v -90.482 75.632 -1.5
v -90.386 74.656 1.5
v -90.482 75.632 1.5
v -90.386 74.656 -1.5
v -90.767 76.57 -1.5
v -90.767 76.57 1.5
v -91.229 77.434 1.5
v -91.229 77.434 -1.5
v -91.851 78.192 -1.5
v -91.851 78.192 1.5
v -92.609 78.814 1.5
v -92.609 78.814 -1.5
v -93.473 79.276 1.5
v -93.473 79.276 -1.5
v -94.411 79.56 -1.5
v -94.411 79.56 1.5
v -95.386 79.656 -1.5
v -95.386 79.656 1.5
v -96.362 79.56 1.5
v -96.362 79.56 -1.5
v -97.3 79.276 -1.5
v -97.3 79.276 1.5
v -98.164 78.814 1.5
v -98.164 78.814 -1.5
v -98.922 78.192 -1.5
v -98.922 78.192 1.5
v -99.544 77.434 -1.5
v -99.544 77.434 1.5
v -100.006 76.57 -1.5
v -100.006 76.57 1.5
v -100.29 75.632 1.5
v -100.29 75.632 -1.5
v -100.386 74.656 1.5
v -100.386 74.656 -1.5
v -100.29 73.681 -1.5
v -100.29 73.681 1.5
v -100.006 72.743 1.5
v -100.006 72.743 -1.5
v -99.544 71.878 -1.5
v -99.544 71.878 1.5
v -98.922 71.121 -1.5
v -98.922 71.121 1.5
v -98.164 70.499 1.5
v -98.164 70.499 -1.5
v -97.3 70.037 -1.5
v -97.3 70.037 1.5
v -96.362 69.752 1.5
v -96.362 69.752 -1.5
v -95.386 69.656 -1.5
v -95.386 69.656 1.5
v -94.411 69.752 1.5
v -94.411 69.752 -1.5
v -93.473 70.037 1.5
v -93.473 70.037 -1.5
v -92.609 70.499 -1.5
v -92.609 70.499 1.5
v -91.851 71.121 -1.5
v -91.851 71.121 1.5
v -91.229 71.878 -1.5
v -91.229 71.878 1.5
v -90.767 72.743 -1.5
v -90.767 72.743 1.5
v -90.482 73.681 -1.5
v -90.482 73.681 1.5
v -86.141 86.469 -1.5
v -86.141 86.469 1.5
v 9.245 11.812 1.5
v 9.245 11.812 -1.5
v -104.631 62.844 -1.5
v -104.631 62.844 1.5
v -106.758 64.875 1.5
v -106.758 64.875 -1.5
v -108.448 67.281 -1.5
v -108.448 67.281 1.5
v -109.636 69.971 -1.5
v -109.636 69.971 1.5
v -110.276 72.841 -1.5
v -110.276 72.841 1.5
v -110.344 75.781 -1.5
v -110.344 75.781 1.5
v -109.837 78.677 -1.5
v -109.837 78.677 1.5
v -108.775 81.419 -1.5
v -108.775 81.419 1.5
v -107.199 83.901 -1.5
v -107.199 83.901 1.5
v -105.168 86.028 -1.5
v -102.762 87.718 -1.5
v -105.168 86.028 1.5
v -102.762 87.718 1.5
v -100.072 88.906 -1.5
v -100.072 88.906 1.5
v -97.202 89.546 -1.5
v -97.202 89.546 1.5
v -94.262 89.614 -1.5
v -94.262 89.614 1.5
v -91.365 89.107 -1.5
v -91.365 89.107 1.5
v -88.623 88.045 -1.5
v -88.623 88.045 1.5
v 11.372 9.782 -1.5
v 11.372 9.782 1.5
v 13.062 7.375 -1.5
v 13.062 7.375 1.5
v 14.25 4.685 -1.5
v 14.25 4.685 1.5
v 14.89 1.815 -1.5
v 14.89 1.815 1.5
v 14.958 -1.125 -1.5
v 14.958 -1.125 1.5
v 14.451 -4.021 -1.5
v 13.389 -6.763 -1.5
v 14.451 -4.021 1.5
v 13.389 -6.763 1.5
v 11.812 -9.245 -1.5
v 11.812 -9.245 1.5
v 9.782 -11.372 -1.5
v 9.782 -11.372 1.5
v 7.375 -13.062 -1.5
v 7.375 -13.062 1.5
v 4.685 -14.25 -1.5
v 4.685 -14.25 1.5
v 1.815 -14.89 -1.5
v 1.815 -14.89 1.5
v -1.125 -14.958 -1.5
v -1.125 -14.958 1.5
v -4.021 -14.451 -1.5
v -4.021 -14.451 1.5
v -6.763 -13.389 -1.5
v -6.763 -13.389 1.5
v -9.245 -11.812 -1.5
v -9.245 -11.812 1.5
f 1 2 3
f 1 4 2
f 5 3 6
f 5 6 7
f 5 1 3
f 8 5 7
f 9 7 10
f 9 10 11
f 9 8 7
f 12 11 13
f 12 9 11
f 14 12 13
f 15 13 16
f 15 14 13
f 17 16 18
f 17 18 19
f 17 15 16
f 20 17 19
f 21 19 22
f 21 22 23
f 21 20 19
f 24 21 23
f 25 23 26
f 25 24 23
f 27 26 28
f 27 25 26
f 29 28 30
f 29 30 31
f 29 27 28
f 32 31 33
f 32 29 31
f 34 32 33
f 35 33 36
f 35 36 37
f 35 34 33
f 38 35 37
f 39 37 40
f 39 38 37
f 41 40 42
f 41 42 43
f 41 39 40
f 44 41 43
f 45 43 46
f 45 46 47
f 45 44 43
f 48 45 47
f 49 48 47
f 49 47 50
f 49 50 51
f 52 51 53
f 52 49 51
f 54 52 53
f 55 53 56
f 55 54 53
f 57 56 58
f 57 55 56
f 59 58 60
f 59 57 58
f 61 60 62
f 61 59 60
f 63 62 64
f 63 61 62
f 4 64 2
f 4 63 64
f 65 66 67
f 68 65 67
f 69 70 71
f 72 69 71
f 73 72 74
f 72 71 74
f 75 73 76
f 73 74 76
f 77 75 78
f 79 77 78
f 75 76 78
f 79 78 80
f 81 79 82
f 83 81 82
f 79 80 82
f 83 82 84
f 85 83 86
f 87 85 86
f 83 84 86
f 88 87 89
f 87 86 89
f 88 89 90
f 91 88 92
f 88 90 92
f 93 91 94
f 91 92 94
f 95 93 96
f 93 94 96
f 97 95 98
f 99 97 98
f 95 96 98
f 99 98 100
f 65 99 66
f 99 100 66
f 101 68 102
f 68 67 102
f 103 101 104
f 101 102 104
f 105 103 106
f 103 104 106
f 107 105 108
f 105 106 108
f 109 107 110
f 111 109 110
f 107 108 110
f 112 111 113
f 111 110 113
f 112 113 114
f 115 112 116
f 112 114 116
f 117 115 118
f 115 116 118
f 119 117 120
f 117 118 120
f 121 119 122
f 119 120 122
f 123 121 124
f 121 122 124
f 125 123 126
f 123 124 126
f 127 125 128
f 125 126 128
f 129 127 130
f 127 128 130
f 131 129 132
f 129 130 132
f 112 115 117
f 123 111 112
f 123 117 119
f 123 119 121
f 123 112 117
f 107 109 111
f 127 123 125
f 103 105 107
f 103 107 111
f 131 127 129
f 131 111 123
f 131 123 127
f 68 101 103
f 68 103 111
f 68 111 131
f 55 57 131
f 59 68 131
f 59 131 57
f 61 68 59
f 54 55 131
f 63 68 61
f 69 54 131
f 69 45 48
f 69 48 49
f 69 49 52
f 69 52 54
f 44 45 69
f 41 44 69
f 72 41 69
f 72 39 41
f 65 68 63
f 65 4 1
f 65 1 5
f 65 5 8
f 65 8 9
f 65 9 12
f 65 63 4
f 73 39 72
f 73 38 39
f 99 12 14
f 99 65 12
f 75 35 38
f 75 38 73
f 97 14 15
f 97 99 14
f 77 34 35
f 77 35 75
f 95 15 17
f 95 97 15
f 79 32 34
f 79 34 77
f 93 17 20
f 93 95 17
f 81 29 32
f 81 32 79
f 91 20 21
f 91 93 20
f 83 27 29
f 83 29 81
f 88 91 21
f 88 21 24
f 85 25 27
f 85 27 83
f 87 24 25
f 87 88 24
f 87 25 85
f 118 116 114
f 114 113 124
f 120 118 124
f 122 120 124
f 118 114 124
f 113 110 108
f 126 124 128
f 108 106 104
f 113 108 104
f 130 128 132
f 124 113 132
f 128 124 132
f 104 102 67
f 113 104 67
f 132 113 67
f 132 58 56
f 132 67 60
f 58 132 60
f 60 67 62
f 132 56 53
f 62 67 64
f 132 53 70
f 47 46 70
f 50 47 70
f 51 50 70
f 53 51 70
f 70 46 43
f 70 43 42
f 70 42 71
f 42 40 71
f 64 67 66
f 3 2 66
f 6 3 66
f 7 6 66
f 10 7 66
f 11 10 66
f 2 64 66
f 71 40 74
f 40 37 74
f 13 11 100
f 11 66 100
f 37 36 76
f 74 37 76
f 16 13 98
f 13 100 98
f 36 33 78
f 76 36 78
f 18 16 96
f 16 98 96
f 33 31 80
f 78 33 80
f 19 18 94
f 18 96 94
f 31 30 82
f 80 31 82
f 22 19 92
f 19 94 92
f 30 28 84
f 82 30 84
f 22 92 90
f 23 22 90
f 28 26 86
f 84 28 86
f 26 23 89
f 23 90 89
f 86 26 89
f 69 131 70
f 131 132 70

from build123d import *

# Parameters (mm, degrees)
SKETCH1_R           = 5
BOSS_EXTRUDE1_DEPTH = 1.5


with BuildPart() as part:
    # Sketch1 → Boss-Extrude1 (new, symmetric)
    with BuildSketch(Plane.XY):
        with BuildLine():
            Line((-86.14130577, 86.468523976), (9.245091692, 11.812208921))
            ThreePointArc((9.245091692, 11.812208921), (11.812208921, -9.245091692), (-9.245091692, -11.812208921))
            Line((-9.245091692, -11.812208921), (-104.631489155, 62.844106133))
            ThreePointArc((-104.631489155, 62.844106133), (-107.198606384, 83.901406746), (-86.14130577, 86.468523976))
        make_face()
        with Locations((-95.386397462, 74.656315054)):
            Circle(SKETCH1_R, mode=Mode.SUBTRACT)
    extrude(amount=BOSS_EXTRUDE1_DEPTH, both=True)


solid = part.part
